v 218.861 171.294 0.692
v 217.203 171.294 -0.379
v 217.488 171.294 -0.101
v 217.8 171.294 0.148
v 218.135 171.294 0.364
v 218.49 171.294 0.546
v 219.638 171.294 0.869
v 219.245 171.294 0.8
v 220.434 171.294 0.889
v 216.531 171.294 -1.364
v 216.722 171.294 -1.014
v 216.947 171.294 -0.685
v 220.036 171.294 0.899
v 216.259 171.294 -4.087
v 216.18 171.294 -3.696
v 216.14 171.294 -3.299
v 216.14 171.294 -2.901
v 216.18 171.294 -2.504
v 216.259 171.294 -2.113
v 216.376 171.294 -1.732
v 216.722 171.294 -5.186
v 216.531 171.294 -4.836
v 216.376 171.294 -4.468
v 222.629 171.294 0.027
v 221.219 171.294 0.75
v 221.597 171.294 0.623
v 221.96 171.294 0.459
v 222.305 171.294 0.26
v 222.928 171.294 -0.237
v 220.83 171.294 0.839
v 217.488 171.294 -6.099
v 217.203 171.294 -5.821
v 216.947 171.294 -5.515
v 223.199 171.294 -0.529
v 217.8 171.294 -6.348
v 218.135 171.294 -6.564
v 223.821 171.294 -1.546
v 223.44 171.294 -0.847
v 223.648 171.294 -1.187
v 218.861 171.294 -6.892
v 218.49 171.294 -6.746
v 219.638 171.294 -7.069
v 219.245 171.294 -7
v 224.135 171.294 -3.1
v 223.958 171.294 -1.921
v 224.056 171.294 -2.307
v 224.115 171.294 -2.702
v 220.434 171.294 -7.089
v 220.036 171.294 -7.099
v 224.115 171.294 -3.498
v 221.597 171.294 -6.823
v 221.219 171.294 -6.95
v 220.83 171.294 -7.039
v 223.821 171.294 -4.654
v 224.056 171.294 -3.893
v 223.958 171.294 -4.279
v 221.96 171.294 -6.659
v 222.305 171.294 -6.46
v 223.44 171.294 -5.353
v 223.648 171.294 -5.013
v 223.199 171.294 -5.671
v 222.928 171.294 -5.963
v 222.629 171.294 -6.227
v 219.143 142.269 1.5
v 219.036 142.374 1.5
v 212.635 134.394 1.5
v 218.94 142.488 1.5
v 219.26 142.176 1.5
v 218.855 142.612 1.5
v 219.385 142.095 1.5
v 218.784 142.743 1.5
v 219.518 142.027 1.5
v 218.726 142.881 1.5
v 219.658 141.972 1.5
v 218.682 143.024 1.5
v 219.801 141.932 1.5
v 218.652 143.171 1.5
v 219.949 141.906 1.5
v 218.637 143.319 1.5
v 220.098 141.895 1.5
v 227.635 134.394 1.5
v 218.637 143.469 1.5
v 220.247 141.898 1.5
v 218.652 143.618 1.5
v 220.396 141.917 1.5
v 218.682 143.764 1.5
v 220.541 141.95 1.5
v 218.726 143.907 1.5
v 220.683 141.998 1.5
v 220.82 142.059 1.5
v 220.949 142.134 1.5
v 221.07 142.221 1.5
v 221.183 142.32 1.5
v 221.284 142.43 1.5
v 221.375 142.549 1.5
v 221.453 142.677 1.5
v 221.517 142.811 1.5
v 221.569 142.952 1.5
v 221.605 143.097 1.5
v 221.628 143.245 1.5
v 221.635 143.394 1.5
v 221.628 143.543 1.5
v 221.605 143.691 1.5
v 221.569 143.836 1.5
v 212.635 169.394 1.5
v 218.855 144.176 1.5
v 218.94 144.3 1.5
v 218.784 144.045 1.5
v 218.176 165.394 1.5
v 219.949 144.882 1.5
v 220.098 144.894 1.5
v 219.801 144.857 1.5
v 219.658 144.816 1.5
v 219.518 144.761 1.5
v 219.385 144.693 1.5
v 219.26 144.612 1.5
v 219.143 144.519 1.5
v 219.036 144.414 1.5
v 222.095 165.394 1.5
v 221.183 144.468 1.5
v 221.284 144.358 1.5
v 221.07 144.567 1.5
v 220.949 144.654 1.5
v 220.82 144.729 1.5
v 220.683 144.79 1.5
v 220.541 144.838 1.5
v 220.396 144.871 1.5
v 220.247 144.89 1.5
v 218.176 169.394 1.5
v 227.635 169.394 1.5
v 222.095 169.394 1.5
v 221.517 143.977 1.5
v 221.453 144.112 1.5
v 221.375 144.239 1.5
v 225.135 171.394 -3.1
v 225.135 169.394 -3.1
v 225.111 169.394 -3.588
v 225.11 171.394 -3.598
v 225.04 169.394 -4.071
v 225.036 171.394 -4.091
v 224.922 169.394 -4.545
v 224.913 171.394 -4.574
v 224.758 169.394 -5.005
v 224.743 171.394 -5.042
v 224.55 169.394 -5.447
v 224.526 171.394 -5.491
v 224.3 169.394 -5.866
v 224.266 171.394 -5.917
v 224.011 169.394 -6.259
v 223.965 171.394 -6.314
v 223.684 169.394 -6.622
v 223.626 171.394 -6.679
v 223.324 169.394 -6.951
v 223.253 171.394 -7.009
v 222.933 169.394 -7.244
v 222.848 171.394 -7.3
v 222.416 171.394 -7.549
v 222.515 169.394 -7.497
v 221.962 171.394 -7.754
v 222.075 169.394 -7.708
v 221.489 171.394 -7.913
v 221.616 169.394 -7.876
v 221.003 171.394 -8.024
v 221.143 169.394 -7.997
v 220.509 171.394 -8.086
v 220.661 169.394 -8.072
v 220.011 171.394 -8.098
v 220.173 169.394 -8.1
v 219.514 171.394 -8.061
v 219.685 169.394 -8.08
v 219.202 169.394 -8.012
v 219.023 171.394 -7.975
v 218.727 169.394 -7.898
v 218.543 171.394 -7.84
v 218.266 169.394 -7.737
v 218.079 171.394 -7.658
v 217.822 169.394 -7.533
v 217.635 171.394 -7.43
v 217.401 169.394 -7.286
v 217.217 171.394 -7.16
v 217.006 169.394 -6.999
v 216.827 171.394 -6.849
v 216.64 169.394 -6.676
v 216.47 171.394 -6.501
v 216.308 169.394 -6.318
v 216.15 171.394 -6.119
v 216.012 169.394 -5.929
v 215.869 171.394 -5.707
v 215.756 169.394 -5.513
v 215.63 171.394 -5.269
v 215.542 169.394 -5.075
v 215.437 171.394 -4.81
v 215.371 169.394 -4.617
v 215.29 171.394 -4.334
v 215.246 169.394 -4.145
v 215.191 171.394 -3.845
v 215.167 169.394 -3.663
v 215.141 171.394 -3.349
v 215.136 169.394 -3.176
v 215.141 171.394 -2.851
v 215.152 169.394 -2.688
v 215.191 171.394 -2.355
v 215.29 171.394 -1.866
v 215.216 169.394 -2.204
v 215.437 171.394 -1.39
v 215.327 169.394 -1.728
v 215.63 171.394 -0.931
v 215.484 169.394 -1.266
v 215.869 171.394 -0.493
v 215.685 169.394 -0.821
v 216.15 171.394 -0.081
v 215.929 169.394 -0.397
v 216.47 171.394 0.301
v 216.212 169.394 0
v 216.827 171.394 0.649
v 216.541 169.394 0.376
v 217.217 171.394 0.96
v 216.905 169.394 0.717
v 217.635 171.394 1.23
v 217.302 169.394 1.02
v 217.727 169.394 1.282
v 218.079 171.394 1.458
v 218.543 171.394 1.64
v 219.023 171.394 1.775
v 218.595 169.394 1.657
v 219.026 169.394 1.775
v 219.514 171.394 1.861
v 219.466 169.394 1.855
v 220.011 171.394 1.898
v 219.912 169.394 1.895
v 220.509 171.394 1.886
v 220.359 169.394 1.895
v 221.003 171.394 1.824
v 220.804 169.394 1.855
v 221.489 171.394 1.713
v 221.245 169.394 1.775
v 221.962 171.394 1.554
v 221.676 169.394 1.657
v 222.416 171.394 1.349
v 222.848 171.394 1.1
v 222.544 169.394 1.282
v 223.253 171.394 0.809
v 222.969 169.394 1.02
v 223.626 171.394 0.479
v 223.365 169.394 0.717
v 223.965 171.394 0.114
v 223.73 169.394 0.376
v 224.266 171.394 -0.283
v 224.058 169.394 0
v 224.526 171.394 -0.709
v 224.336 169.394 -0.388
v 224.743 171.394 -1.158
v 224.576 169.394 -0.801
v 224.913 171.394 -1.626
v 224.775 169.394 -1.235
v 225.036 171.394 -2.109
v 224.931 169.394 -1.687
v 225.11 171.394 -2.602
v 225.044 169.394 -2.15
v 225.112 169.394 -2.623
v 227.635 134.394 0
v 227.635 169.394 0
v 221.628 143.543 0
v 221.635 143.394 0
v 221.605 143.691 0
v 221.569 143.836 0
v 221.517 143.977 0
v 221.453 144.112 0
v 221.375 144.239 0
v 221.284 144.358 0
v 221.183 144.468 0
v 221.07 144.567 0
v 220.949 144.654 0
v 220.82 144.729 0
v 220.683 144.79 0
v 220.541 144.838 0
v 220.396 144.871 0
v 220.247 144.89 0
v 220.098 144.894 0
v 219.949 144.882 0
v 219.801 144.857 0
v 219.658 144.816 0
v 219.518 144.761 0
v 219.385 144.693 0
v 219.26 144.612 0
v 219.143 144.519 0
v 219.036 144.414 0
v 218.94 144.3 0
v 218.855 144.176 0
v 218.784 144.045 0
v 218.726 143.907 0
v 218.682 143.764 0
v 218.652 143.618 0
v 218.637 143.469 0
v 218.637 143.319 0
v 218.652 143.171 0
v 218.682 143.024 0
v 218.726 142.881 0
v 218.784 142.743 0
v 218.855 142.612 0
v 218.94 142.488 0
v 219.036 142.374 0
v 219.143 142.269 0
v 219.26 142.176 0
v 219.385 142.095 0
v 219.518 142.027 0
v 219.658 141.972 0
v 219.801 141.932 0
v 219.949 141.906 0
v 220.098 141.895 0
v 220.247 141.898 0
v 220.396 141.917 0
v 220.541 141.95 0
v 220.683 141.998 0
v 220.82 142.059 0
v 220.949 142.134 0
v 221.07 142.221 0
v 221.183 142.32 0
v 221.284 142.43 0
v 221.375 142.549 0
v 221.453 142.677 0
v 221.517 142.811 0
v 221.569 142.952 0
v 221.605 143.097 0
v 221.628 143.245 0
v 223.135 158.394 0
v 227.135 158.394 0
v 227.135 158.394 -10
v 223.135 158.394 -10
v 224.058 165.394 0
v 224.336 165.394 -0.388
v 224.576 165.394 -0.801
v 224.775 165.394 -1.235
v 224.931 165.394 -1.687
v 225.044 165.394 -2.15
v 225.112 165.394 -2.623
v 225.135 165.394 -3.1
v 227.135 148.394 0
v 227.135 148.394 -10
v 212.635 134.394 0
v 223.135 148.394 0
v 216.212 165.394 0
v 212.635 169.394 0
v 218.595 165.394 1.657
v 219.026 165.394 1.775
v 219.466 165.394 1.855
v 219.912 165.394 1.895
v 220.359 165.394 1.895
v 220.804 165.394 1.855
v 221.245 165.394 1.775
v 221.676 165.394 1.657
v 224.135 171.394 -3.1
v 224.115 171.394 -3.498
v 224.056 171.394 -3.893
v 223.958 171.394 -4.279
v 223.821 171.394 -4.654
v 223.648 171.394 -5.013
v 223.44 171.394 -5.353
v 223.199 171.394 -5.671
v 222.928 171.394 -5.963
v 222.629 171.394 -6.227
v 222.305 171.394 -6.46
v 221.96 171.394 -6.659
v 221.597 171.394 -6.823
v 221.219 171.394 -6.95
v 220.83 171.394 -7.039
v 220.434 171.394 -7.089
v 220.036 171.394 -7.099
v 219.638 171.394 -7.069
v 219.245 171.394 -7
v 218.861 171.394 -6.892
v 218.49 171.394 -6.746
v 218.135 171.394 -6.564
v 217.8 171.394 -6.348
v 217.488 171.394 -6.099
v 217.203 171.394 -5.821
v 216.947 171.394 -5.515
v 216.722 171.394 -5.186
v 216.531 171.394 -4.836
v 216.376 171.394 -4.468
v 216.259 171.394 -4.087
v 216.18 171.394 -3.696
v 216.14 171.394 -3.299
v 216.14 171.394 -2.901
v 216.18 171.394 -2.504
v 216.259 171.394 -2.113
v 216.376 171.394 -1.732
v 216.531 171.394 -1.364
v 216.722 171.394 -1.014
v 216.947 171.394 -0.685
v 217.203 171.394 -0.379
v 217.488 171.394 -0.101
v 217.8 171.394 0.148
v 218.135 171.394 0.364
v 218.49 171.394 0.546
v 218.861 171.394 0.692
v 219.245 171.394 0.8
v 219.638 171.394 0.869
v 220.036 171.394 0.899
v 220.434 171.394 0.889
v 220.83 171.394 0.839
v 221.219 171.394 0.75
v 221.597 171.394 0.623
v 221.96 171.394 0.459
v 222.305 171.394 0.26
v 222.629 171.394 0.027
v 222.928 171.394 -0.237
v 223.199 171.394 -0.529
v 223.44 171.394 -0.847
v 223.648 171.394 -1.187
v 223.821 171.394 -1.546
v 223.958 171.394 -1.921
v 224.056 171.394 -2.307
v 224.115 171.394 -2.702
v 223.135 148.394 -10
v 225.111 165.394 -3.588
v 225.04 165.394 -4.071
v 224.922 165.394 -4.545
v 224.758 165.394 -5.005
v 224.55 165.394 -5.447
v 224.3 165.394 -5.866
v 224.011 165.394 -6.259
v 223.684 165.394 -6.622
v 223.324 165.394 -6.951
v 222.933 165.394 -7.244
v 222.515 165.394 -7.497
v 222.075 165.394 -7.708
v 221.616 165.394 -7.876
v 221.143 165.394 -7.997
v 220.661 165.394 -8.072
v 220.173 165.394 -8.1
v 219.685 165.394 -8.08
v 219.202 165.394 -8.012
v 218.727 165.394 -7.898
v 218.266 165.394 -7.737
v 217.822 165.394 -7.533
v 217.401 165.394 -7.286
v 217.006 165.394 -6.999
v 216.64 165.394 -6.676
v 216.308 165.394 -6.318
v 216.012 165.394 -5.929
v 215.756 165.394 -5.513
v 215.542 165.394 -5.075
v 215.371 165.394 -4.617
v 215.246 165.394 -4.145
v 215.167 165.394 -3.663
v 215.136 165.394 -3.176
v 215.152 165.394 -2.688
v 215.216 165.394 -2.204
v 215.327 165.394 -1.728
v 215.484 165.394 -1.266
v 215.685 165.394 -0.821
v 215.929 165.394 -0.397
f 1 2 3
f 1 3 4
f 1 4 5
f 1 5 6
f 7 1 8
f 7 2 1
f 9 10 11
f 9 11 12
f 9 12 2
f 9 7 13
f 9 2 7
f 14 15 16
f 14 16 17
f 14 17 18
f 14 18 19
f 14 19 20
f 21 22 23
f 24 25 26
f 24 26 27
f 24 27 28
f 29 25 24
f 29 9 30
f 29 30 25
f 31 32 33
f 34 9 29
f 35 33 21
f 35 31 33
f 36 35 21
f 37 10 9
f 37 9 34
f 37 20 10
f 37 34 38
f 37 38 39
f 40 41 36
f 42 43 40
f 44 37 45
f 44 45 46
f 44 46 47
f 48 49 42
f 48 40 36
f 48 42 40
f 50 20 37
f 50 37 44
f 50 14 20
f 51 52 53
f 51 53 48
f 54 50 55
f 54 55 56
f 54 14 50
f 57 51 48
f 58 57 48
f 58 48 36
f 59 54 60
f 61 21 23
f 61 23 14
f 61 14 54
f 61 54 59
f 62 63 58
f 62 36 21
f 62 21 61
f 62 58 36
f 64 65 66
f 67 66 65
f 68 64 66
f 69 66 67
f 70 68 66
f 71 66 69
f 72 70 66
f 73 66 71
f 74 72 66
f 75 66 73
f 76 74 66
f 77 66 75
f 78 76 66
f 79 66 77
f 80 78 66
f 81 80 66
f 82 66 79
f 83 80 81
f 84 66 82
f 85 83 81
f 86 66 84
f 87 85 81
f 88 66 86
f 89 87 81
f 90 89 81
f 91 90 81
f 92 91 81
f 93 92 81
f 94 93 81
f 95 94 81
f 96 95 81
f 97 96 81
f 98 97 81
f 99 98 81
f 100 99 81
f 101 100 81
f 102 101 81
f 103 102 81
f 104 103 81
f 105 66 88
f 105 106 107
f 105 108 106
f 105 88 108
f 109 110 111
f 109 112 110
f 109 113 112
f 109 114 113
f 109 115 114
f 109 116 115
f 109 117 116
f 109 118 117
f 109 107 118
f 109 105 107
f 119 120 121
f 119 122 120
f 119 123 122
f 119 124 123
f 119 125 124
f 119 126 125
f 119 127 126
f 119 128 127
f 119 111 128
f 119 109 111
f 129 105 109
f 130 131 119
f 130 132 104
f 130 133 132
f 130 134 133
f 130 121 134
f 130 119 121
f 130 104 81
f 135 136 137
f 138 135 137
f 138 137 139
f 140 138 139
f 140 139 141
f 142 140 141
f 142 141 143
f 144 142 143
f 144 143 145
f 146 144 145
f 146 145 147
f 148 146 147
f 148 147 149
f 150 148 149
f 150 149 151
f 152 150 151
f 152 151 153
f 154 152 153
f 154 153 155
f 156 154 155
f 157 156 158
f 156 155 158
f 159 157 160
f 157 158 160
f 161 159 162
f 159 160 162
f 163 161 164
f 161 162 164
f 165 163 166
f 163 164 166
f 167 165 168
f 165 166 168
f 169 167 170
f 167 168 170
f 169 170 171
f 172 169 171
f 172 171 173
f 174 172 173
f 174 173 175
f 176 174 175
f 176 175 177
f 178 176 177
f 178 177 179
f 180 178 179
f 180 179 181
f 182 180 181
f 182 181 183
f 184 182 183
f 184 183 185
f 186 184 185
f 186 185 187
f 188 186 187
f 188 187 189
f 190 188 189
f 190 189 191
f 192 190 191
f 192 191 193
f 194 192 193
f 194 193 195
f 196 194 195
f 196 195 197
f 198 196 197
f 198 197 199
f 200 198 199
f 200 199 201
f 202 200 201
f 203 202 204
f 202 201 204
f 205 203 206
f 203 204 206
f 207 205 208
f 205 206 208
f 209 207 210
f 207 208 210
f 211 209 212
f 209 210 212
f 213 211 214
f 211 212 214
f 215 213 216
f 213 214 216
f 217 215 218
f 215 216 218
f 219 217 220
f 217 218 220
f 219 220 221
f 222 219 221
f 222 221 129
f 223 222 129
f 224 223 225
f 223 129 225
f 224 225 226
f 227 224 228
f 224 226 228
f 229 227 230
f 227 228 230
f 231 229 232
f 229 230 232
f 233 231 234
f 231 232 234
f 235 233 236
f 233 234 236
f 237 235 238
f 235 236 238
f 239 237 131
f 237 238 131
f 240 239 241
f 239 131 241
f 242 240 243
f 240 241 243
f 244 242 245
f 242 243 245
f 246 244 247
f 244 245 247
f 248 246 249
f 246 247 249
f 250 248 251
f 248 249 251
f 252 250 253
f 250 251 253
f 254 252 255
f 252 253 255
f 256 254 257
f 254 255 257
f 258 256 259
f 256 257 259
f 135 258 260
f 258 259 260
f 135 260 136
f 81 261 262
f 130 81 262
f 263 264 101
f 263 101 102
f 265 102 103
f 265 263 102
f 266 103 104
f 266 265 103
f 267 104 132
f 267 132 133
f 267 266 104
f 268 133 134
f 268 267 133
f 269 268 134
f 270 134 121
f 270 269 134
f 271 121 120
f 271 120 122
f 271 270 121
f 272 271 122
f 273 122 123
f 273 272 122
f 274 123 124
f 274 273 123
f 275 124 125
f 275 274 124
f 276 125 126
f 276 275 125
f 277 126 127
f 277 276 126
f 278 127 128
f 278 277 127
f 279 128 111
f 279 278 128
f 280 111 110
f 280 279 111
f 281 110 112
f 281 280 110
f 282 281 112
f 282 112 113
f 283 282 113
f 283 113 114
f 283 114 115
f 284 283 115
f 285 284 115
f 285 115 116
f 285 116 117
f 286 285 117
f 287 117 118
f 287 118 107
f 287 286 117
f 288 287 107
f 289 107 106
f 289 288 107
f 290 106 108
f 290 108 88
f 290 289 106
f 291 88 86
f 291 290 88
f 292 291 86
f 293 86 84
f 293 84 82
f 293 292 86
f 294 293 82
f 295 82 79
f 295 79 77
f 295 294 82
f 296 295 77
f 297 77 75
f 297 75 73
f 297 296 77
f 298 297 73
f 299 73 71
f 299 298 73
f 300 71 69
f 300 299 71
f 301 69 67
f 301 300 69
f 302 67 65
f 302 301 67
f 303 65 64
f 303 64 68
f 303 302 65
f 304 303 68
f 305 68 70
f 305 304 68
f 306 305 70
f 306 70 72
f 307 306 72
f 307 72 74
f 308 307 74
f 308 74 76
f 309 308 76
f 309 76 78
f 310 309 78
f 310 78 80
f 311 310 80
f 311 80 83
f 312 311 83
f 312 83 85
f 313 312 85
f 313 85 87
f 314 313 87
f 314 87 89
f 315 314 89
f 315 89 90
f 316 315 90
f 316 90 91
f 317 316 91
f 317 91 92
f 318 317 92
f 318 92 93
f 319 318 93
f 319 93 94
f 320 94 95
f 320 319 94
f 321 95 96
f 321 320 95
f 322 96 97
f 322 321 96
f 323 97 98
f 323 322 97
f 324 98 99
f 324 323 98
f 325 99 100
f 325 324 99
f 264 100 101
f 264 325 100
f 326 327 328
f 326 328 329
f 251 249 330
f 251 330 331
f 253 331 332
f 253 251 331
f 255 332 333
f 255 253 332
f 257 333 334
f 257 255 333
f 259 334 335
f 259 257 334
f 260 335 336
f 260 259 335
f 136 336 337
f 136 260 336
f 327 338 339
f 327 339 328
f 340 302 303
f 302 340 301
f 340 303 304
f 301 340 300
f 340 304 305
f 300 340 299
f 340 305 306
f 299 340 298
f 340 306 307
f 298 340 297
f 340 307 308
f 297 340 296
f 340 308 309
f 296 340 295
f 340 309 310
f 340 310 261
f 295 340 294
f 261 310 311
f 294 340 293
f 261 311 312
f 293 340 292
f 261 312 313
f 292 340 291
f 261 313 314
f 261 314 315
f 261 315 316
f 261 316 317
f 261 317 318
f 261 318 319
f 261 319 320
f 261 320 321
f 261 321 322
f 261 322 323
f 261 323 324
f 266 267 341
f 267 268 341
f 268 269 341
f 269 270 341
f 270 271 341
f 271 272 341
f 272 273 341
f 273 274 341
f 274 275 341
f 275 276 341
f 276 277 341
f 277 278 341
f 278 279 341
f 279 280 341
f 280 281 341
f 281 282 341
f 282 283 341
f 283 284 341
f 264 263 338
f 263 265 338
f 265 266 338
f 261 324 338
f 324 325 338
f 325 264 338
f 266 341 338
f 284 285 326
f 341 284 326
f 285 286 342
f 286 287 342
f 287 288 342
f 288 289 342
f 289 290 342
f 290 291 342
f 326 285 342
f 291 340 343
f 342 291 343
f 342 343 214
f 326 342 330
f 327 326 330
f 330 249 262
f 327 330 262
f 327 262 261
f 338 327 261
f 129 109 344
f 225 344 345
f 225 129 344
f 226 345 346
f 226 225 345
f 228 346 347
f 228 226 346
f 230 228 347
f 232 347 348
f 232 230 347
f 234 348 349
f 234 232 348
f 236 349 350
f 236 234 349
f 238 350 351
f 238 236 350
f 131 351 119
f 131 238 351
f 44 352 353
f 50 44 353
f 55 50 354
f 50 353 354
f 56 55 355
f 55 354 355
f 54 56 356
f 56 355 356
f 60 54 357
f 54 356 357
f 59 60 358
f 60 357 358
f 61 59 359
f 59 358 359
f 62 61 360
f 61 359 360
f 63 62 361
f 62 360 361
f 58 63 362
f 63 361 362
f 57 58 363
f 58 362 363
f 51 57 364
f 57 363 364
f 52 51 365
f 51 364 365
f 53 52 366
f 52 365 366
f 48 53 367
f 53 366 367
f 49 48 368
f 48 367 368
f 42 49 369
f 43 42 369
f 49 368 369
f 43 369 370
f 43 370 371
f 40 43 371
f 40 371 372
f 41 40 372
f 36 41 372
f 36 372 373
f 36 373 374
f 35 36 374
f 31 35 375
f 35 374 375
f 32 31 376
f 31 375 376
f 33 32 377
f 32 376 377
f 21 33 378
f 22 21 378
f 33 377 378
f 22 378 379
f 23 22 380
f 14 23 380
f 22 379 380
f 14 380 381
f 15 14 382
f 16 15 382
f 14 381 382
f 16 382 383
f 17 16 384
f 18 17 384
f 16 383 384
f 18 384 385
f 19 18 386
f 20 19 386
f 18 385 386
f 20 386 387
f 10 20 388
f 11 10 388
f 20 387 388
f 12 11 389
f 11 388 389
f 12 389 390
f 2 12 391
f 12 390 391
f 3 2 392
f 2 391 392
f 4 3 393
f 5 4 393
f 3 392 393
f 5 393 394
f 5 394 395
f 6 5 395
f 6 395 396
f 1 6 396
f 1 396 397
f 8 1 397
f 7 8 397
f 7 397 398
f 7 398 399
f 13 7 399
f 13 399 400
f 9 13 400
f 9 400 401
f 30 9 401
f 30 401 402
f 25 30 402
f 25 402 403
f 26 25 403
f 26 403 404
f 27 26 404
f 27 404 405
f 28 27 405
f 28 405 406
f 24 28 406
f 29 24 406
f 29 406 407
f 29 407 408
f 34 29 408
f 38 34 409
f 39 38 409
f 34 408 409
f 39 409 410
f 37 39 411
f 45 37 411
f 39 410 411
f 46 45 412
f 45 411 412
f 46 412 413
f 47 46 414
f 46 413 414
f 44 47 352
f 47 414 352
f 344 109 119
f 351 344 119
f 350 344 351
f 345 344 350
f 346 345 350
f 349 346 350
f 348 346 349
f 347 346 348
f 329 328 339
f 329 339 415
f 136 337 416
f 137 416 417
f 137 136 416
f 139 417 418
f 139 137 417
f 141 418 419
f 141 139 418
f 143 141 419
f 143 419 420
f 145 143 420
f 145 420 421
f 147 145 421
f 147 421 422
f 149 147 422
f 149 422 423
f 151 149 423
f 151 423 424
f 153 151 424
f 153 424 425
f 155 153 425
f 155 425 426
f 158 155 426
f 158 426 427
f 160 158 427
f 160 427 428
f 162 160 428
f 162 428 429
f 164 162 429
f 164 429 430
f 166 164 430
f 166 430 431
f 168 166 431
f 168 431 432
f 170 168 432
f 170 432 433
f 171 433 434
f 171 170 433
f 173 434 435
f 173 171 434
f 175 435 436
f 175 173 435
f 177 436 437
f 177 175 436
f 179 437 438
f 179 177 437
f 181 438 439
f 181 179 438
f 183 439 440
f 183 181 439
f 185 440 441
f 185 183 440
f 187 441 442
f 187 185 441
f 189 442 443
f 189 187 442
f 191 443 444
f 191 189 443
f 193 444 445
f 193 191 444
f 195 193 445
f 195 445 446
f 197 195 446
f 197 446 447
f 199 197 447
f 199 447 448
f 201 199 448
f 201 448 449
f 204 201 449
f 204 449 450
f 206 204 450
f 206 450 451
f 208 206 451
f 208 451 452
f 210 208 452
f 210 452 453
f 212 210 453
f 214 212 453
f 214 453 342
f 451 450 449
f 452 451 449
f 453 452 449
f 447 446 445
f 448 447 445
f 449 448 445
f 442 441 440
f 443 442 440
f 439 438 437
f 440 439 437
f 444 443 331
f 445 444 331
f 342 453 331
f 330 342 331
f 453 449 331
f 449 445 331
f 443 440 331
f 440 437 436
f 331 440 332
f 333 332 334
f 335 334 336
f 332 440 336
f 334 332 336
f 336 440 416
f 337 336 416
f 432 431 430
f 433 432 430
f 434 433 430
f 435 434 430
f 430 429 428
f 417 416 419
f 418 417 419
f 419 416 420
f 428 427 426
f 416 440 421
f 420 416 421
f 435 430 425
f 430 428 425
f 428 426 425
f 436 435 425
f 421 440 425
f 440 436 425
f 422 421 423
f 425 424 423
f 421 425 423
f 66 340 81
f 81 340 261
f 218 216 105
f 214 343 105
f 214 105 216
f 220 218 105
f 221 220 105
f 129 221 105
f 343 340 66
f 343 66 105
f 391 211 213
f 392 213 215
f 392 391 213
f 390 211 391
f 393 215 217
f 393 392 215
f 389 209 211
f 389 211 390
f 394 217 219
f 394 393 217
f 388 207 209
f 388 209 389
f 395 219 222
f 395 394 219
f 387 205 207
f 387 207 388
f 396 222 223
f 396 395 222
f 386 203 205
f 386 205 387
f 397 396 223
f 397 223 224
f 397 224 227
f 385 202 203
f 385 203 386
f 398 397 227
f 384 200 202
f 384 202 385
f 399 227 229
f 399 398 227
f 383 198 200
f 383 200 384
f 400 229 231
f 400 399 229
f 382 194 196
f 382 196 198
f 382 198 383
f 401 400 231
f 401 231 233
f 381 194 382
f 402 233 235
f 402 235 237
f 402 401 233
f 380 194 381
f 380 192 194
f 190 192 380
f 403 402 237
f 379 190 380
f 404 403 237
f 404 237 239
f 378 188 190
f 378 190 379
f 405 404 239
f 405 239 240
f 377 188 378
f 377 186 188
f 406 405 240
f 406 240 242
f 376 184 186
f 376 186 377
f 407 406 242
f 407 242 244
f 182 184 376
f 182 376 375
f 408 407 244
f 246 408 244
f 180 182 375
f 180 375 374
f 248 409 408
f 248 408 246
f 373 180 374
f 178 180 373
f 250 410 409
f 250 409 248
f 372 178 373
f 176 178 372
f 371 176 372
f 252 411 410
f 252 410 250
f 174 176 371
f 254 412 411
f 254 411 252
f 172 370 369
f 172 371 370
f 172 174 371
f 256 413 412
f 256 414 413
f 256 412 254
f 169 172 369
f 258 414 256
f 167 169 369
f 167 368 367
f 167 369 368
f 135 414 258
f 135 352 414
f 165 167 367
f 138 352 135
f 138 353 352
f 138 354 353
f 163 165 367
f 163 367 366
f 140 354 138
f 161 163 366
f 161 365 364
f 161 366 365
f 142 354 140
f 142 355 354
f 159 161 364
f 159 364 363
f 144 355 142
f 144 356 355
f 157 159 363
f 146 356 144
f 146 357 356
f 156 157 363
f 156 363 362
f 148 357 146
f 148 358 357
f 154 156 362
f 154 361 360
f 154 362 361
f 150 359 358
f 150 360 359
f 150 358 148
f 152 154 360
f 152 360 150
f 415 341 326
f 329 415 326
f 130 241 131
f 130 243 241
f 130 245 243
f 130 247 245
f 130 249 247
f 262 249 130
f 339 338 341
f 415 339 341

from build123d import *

# Parameters (mm, degrees)
SKETCH1_W                = 15
SKETCH1_H                = 35
SKETCH1_R                = 1.5
BOSS_EXTRUDE1_DEPTH      = 1.5
SKETCH2_R                = 5
BOSS_EXTRUDE2_DEPTH      = 2
BOSS_EXTRUDE2_DEPTH_BACK = 4
SKETCH3_R                = 4
CUT_EXTRUDE1_DEPTH       = 0.1
SKETCH4_W                = 4
SKETCH4_H                = 10
BOSS_EXTRUDE3_DEPTH      = 10


with BuildPart() as part:
    # Sketch1 → Boss-Extrude1 (new body)
    with BuildSketch(Plane.XY):
        with Locations((220.135234982, 151.894136477)):
            Rectangle(SKETCH1_W, SKETCH1_H)
        with Locations((220.135234982, 143.394136477)):
            Circle(SKETCH1_R, mode=Mode.SUBTRACT)
    extrude(amount=BOSS_EXTRUDE1_DEPTH)

    # Sketch2 → Boss-Extrude2 (add, two sides)
    with BuildSketch(Plane(origin=(0, 169.394136477, 0), x_dir=(1, 0, 0), z_dir=(0, 1, 0))) as boss_extrude2_sk:
        with Locations((220.135234982, 3.1)):
            Circle(SKETCH2_R)
    extrude(amount=BOSS_EXTRUDE2_DEPTH)
    extrude(boss_extrude2_sk.sketch, amount=-BOSS_EXTRUDE2_DEPTH_BACK)

    # Sketch3 → Cut-Extrude1 (cut)
    with BuildSketch(Plane(origin=(0, 171.394136477, 0), x_dir=(1, 0, 0), z_dir=(0, 1, 0))):
        with Locations((220.135234982, 3.1)):
            Circle(SKETCH3_R)
    extrude(amount=-CUT_EXTRUDE1_DEPTH, mode=Mode.SUBTRACT)

    # Sketch4 → Boss-Extrude3 (add)
    with BuildSketch(Plane(origin=(0, 0, 0), x_dir=(-1, 0, 0), z_dir=(0, 0, -1))):
        with Locations((-225.135234982, 153.394136477)):
            Rectangle(SKETCH4_W, SKETCH4_H)
    extrude(amount=BOSS_EXTRUDE3_DEPTH)


solid = part.part
